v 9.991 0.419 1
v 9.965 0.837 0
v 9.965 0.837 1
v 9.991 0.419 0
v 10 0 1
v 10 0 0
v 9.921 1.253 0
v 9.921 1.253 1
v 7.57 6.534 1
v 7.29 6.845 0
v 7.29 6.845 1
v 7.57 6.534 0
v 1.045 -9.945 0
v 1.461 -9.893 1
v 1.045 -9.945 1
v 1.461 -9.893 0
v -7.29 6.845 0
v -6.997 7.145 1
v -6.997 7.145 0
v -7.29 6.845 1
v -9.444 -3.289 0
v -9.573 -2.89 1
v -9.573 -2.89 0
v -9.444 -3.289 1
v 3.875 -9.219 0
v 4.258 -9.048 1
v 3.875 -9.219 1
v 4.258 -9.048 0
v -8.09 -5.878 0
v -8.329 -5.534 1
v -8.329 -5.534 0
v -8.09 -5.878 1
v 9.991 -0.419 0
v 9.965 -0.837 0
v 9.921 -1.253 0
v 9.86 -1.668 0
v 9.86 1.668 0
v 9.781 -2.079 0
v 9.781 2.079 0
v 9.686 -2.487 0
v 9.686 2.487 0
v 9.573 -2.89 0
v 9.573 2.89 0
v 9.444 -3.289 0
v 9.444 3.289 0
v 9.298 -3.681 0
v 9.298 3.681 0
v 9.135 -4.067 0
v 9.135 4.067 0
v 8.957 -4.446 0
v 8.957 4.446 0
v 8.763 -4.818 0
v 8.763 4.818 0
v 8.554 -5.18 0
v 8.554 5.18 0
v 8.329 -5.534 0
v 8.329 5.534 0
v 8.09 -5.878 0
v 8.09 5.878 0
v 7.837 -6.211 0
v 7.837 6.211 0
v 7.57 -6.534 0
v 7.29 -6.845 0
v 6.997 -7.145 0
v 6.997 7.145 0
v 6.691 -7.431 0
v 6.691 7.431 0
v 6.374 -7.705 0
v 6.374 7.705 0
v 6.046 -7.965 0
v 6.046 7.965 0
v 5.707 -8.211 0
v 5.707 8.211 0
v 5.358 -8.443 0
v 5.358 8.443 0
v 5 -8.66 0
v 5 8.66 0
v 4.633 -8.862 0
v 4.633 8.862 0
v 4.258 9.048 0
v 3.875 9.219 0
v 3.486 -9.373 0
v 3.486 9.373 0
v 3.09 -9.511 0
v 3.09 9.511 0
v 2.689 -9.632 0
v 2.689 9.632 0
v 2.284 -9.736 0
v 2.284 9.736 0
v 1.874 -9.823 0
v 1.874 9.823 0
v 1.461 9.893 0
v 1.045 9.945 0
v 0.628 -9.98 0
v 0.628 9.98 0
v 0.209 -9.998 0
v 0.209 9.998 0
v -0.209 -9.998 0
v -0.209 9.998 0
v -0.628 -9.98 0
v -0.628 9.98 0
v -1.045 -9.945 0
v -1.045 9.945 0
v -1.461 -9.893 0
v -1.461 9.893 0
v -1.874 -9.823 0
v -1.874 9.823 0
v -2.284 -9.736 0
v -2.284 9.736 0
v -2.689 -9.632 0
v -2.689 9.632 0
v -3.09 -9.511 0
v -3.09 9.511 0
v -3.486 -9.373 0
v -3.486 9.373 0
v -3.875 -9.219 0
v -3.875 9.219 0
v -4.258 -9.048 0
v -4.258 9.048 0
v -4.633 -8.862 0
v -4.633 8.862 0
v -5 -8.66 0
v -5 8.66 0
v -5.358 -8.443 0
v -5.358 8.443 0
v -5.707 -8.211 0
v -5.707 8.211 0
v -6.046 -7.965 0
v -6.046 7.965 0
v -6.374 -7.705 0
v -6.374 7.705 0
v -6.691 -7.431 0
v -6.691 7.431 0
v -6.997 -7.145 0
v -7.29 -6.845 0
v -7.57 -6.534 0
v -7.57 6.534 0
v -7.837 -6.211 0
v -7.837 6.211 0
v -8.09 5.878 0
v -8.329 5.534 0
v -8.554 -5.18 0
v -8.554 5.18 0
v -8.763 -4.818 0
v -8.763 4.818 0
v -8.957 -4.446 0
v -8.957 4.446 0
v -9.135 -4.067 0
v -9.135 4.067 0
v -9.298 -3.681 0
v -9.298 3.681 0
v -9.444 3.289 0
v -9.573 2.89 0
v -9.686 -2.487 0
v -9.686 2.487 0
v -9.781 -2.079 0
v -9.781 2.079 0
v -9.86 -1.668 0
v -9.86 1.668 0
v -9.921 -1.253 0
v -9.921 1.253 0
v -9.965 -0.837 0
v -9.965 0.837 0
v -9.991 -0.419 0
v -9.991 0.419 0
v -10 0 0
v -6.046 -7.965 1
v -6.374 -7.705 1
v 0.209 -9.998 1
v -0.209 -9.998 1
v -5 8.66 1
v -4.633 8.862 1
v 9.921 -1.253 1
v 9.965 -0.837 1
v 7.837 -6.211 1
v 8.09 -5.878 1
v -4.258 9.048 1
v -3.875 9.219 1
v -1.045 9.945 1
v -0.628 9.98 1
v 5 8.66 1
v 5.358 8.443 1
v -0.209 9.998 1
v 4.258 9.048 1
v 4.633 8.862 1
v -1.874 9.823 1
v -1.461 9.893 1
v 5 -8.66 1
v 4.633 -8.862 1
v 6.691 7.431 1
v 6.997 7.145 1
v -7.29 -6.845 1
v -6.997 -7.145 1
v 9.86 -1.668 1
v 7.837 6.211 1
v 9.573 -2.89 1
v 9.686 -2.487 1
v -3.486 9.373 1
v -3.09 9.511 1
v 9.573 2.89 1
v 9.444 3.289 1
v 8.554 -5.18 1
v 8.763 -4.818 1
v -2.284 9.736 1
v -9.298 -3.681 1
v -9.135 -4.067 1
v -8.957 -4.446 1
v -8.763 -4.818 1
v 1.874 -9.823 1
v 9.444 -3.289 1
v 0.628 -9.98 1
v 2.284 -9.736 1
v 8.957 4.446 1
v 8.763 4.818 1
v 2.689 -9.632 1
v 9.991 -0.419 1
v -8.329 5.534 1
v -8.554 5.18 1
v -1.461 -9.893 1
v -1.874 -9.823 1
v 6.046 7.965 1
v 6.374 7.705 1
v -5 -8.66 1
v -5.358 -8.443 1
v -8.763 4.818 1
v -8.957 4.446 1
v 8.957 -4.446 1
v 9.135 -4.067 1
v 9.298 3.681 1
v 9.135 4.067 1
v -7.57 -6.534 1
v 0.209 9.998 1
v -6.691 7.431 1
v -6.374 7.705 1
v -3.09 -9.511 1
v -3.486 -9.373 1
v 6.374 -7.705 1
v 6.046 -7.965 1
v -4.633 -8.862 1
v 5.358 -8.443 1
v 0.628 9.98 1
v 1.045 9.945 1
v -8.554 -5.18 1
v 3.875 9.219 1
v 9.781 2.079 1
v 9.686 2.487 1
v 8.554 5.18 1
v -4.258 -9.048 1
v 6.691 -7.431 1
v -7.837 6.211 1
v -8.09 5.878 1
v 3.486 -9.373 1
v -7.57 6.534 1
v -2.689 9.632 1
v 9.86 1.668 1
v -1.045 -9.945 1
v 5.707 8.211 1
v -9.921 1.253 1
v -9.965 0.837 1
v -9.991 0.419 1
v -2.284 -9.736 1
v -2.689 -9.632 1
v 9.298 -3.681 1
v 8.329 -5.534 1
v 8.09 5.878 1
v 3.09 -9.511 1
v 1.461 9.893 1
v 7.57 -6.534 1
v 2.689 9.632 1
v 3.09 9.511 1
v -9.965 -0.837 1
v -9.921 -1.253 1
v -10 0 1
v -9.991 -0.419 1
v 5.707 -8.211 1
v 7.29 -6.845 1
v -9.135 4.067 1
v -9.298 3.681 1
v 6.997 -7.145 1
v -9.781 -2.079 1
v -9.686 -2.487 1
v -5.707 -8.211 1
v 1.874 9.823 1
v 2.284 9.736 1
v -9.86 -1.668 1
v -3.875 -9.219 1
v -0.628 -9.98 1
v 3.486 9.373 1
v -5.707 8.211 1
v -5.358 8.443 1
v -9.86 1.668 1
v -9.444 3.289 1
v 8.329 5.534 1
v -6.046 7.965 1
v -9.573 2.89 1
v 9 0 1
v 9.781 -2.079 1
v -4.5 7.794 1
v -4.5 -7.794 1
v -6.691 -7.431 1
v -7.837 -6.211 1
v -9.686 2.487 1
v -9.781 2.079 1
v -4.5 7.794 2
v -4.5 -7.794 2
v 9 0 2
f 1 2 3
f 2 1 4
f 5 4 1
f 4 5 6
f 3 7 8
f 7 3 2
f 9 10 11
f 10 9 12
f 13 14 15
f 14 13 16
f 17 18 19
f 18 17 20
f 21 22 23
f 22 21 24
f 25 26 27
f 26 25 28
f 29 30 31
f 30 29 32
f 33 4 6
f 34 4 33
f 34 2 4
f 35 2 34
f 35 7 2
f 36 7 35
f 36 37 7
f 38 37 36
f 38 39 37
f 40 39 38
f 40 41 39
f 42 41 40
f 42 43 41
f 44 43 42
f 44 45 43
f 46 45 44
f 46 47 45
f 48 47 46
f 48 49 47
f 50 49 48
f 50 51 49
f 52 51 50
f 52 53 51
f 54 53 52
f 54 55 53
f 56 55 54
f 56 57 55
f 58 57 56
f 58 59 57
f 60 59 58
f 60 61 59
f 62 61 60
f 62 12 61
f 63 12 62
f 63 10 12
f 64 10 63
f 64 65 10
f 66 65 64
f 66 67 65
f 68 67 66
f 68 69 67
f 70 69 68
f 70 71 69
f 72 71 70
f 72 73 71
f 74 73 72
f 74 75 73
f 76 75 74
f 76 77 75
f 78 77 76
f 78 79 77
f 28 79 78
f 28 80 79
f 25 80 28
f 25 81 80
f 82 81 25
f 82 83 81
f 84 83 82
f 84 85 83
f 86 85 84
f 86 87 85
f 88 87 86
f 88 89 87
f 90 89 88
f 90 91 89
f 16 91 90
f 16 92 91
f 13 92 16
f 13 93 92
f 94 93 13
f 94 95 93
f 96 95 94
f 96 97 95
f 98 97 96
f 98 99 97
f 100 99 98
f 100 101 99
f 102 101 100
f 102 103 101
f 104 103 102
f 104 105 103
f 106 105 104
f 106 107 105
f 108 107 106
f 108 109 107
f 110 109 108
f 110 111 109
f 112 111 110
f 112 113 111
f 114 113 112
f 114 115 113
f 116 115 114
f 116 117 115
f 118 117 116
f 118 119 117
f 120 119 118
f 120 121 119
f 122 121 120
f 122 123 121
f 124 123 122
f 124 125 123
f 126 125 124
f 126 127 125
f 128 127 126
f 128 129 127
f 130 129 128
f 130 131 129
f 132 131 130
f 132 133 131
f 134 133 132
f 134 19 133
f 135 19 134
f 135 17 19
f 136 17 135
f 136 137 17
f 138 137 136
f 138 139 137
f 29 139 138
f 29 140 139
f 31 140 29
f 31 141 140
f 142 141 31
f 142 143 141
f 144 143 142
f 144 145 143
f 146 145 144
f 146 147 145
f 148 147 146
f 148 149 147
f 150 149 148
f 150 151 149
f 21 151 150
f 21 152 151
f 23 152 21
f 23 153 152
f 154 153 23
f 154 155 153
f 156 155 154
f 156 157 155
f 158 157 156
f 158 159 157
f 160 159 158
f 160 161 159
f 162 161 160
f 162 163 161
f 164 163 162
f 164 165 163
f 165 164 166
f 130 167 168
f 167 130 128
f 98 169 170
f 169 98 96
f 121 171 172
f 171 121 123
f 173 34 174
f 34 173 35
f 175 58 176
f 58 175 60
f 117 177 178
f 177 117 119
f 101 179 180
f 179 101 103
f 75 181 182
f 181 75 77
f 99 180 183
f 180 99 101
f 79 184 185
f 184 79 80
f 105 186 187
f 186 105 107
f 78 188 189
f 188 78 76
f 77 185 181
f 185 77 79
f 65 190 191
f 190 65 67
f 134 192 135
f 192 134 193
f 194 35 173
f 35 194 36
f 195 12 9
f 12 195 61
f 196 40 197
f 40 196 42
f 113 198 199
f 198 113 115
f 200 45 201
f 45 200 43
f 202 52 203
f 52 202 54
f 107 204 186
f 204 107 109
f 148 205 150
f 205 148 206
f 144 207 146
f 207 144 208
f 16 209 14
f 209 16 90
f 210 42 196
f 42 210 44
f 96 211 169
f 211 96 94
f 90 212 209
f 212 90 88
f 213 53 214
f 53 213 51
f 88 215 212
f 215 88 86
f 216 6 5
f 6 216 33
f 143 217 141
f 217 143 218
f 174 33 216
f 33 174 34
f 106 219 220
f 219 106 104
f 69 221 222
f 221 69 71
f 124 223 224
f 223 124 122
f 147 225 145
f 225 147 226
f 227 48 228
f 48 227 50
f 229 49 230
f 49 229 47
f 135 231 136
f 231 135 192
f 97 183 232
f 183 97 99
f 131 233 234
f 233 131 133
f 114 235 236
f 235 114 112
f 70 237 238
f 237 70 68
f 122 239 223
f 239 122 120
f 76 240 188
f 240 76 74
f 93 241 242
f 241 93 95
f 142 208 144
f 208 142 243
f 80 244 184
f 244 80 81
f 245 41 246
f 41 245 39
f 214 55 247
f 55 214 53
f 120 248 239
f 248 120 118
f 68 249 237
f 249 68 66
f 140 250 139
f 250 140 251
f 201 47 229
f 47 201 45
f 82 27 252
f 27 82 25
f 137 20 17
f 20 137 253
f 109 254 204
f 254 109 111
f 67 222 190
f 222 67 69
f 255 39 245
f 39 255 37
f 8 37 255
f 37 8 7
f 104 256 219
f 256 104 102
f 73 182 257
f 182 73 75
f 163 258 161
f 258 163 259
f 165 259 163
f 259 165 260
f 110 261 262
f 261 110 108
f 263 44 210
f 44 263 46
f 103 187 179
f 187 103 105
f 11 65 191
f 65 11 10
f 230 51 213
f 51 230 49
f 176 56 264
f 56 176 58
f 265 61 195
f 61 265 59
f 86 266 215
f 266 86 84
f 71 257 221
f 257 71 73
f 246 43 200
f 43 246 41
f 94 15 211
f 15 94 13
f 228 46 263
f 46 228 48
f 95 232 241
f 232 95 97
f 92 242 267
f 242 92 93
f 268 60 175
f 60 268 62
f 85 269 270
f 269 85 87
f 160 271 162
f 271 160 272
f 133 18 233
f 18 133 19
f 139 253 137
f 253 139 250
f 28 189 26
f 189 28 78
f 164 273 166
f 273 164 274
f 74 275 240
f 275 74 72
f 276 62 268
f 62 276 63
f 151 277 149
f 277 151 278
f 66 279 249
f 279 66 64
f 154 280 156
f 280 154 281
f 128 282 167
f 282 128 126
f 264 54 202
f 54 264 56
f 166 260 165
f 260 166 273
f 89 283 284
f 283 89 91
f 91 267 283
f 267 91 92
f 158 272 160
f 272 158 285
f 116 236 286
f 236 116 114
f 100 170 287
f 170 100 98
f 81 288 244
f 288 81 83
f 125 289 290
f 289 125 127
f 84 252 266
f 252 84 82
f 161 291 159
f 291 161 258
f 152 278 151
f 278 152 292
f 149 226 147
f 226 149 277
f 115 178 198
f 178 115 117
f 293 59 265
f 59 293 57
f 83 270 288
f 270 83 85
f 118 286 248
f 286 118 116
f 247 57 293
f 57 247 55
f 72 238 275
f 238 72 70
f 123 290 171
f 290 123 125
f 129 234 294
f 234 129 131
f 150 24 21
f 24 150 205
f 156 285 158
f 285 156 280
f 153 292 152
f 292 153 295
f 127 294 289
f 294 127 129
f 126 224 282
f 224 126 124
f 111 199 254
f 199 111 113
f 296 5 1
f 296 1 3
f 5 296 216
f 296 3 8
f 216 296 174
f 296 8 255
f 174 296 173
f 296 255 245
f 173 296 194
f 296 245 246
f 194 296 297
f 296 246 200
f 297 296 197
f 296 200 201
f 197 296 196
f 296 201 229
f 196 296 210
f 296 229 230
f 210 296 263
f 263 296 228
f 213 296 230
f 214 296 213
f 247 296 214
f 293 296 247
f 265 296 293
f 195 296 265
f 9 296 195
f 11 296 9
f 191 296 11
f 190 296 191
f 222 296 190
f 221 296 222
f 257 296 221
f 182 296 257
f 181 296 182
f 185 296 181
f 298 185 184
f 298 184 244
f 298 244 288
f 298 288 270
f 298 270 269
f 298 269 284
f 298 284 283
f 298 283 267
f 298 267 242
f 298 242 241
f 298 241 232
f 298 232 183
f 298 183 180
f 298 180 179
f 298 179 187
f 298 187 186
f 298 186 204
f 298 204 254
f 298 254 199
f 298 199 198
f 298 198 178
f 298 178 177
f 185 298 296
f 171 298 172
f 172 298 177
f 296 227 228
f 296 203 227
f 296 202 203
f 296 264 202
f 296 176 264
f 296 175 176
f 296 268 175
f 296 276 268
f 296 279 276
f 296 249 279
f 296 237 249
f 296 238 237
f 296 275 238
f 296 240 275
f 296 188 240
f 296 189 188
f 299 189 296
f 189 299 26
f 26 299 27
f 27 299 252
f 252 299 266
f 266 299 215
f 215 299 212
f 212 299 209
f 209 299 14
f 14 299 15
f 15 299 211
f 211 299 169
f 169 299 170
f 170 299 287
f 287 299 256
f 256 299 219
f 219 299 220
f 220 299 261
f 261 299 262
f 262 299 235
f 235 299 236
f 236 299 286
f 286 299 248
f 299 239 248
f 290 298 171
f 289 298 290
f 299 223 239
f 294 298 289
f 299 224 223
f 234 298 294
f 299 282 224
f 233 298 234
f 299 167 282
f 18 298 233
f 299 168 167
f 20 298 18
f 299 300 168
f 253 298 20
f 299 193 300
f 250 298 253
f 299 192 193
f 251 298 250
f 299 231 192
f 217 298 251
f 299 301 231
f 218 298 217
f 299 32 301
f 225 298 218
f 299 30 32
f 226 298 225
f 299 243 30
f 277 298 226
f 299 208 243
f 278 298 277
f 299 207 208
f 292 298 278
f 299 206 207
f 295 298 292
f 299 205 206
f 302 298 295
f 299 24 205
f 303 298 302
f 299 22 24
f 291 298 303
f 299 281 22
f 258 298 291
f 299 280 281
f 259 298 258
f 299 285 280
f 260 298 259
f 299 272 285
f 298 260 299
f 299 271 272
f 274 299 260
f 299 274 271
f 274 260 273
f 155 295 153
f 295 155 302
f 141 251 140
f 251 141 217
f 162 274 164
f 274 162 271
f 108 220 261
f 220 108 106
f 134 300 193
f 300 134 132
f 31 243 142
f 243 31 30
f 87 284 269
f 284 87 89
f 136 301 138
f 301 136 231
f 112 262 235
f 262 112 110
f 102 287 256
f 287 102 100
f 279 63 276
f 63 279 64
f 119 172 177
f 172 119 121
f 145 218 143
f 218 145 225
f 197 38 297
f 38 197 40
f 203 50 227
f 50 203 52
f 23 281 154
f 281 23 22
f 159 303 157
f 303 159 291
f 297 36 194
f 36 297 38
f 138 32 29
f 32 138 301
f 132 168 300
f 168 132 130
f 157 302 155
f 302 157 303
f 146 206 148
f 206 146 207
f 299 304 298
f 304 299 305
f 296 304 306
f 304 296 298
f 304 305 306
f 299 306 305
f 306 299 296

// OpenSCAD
$fn = 150;

union() {
	cylinder(d = 20.0, h = 1.0);
	color(alpha = 1.0, c = "grey") {
		translate(v = [0, 0, 1.0]) {
			cylinder($fn = 3, d = 18.0, h = 1.0);
		}
	}
}
